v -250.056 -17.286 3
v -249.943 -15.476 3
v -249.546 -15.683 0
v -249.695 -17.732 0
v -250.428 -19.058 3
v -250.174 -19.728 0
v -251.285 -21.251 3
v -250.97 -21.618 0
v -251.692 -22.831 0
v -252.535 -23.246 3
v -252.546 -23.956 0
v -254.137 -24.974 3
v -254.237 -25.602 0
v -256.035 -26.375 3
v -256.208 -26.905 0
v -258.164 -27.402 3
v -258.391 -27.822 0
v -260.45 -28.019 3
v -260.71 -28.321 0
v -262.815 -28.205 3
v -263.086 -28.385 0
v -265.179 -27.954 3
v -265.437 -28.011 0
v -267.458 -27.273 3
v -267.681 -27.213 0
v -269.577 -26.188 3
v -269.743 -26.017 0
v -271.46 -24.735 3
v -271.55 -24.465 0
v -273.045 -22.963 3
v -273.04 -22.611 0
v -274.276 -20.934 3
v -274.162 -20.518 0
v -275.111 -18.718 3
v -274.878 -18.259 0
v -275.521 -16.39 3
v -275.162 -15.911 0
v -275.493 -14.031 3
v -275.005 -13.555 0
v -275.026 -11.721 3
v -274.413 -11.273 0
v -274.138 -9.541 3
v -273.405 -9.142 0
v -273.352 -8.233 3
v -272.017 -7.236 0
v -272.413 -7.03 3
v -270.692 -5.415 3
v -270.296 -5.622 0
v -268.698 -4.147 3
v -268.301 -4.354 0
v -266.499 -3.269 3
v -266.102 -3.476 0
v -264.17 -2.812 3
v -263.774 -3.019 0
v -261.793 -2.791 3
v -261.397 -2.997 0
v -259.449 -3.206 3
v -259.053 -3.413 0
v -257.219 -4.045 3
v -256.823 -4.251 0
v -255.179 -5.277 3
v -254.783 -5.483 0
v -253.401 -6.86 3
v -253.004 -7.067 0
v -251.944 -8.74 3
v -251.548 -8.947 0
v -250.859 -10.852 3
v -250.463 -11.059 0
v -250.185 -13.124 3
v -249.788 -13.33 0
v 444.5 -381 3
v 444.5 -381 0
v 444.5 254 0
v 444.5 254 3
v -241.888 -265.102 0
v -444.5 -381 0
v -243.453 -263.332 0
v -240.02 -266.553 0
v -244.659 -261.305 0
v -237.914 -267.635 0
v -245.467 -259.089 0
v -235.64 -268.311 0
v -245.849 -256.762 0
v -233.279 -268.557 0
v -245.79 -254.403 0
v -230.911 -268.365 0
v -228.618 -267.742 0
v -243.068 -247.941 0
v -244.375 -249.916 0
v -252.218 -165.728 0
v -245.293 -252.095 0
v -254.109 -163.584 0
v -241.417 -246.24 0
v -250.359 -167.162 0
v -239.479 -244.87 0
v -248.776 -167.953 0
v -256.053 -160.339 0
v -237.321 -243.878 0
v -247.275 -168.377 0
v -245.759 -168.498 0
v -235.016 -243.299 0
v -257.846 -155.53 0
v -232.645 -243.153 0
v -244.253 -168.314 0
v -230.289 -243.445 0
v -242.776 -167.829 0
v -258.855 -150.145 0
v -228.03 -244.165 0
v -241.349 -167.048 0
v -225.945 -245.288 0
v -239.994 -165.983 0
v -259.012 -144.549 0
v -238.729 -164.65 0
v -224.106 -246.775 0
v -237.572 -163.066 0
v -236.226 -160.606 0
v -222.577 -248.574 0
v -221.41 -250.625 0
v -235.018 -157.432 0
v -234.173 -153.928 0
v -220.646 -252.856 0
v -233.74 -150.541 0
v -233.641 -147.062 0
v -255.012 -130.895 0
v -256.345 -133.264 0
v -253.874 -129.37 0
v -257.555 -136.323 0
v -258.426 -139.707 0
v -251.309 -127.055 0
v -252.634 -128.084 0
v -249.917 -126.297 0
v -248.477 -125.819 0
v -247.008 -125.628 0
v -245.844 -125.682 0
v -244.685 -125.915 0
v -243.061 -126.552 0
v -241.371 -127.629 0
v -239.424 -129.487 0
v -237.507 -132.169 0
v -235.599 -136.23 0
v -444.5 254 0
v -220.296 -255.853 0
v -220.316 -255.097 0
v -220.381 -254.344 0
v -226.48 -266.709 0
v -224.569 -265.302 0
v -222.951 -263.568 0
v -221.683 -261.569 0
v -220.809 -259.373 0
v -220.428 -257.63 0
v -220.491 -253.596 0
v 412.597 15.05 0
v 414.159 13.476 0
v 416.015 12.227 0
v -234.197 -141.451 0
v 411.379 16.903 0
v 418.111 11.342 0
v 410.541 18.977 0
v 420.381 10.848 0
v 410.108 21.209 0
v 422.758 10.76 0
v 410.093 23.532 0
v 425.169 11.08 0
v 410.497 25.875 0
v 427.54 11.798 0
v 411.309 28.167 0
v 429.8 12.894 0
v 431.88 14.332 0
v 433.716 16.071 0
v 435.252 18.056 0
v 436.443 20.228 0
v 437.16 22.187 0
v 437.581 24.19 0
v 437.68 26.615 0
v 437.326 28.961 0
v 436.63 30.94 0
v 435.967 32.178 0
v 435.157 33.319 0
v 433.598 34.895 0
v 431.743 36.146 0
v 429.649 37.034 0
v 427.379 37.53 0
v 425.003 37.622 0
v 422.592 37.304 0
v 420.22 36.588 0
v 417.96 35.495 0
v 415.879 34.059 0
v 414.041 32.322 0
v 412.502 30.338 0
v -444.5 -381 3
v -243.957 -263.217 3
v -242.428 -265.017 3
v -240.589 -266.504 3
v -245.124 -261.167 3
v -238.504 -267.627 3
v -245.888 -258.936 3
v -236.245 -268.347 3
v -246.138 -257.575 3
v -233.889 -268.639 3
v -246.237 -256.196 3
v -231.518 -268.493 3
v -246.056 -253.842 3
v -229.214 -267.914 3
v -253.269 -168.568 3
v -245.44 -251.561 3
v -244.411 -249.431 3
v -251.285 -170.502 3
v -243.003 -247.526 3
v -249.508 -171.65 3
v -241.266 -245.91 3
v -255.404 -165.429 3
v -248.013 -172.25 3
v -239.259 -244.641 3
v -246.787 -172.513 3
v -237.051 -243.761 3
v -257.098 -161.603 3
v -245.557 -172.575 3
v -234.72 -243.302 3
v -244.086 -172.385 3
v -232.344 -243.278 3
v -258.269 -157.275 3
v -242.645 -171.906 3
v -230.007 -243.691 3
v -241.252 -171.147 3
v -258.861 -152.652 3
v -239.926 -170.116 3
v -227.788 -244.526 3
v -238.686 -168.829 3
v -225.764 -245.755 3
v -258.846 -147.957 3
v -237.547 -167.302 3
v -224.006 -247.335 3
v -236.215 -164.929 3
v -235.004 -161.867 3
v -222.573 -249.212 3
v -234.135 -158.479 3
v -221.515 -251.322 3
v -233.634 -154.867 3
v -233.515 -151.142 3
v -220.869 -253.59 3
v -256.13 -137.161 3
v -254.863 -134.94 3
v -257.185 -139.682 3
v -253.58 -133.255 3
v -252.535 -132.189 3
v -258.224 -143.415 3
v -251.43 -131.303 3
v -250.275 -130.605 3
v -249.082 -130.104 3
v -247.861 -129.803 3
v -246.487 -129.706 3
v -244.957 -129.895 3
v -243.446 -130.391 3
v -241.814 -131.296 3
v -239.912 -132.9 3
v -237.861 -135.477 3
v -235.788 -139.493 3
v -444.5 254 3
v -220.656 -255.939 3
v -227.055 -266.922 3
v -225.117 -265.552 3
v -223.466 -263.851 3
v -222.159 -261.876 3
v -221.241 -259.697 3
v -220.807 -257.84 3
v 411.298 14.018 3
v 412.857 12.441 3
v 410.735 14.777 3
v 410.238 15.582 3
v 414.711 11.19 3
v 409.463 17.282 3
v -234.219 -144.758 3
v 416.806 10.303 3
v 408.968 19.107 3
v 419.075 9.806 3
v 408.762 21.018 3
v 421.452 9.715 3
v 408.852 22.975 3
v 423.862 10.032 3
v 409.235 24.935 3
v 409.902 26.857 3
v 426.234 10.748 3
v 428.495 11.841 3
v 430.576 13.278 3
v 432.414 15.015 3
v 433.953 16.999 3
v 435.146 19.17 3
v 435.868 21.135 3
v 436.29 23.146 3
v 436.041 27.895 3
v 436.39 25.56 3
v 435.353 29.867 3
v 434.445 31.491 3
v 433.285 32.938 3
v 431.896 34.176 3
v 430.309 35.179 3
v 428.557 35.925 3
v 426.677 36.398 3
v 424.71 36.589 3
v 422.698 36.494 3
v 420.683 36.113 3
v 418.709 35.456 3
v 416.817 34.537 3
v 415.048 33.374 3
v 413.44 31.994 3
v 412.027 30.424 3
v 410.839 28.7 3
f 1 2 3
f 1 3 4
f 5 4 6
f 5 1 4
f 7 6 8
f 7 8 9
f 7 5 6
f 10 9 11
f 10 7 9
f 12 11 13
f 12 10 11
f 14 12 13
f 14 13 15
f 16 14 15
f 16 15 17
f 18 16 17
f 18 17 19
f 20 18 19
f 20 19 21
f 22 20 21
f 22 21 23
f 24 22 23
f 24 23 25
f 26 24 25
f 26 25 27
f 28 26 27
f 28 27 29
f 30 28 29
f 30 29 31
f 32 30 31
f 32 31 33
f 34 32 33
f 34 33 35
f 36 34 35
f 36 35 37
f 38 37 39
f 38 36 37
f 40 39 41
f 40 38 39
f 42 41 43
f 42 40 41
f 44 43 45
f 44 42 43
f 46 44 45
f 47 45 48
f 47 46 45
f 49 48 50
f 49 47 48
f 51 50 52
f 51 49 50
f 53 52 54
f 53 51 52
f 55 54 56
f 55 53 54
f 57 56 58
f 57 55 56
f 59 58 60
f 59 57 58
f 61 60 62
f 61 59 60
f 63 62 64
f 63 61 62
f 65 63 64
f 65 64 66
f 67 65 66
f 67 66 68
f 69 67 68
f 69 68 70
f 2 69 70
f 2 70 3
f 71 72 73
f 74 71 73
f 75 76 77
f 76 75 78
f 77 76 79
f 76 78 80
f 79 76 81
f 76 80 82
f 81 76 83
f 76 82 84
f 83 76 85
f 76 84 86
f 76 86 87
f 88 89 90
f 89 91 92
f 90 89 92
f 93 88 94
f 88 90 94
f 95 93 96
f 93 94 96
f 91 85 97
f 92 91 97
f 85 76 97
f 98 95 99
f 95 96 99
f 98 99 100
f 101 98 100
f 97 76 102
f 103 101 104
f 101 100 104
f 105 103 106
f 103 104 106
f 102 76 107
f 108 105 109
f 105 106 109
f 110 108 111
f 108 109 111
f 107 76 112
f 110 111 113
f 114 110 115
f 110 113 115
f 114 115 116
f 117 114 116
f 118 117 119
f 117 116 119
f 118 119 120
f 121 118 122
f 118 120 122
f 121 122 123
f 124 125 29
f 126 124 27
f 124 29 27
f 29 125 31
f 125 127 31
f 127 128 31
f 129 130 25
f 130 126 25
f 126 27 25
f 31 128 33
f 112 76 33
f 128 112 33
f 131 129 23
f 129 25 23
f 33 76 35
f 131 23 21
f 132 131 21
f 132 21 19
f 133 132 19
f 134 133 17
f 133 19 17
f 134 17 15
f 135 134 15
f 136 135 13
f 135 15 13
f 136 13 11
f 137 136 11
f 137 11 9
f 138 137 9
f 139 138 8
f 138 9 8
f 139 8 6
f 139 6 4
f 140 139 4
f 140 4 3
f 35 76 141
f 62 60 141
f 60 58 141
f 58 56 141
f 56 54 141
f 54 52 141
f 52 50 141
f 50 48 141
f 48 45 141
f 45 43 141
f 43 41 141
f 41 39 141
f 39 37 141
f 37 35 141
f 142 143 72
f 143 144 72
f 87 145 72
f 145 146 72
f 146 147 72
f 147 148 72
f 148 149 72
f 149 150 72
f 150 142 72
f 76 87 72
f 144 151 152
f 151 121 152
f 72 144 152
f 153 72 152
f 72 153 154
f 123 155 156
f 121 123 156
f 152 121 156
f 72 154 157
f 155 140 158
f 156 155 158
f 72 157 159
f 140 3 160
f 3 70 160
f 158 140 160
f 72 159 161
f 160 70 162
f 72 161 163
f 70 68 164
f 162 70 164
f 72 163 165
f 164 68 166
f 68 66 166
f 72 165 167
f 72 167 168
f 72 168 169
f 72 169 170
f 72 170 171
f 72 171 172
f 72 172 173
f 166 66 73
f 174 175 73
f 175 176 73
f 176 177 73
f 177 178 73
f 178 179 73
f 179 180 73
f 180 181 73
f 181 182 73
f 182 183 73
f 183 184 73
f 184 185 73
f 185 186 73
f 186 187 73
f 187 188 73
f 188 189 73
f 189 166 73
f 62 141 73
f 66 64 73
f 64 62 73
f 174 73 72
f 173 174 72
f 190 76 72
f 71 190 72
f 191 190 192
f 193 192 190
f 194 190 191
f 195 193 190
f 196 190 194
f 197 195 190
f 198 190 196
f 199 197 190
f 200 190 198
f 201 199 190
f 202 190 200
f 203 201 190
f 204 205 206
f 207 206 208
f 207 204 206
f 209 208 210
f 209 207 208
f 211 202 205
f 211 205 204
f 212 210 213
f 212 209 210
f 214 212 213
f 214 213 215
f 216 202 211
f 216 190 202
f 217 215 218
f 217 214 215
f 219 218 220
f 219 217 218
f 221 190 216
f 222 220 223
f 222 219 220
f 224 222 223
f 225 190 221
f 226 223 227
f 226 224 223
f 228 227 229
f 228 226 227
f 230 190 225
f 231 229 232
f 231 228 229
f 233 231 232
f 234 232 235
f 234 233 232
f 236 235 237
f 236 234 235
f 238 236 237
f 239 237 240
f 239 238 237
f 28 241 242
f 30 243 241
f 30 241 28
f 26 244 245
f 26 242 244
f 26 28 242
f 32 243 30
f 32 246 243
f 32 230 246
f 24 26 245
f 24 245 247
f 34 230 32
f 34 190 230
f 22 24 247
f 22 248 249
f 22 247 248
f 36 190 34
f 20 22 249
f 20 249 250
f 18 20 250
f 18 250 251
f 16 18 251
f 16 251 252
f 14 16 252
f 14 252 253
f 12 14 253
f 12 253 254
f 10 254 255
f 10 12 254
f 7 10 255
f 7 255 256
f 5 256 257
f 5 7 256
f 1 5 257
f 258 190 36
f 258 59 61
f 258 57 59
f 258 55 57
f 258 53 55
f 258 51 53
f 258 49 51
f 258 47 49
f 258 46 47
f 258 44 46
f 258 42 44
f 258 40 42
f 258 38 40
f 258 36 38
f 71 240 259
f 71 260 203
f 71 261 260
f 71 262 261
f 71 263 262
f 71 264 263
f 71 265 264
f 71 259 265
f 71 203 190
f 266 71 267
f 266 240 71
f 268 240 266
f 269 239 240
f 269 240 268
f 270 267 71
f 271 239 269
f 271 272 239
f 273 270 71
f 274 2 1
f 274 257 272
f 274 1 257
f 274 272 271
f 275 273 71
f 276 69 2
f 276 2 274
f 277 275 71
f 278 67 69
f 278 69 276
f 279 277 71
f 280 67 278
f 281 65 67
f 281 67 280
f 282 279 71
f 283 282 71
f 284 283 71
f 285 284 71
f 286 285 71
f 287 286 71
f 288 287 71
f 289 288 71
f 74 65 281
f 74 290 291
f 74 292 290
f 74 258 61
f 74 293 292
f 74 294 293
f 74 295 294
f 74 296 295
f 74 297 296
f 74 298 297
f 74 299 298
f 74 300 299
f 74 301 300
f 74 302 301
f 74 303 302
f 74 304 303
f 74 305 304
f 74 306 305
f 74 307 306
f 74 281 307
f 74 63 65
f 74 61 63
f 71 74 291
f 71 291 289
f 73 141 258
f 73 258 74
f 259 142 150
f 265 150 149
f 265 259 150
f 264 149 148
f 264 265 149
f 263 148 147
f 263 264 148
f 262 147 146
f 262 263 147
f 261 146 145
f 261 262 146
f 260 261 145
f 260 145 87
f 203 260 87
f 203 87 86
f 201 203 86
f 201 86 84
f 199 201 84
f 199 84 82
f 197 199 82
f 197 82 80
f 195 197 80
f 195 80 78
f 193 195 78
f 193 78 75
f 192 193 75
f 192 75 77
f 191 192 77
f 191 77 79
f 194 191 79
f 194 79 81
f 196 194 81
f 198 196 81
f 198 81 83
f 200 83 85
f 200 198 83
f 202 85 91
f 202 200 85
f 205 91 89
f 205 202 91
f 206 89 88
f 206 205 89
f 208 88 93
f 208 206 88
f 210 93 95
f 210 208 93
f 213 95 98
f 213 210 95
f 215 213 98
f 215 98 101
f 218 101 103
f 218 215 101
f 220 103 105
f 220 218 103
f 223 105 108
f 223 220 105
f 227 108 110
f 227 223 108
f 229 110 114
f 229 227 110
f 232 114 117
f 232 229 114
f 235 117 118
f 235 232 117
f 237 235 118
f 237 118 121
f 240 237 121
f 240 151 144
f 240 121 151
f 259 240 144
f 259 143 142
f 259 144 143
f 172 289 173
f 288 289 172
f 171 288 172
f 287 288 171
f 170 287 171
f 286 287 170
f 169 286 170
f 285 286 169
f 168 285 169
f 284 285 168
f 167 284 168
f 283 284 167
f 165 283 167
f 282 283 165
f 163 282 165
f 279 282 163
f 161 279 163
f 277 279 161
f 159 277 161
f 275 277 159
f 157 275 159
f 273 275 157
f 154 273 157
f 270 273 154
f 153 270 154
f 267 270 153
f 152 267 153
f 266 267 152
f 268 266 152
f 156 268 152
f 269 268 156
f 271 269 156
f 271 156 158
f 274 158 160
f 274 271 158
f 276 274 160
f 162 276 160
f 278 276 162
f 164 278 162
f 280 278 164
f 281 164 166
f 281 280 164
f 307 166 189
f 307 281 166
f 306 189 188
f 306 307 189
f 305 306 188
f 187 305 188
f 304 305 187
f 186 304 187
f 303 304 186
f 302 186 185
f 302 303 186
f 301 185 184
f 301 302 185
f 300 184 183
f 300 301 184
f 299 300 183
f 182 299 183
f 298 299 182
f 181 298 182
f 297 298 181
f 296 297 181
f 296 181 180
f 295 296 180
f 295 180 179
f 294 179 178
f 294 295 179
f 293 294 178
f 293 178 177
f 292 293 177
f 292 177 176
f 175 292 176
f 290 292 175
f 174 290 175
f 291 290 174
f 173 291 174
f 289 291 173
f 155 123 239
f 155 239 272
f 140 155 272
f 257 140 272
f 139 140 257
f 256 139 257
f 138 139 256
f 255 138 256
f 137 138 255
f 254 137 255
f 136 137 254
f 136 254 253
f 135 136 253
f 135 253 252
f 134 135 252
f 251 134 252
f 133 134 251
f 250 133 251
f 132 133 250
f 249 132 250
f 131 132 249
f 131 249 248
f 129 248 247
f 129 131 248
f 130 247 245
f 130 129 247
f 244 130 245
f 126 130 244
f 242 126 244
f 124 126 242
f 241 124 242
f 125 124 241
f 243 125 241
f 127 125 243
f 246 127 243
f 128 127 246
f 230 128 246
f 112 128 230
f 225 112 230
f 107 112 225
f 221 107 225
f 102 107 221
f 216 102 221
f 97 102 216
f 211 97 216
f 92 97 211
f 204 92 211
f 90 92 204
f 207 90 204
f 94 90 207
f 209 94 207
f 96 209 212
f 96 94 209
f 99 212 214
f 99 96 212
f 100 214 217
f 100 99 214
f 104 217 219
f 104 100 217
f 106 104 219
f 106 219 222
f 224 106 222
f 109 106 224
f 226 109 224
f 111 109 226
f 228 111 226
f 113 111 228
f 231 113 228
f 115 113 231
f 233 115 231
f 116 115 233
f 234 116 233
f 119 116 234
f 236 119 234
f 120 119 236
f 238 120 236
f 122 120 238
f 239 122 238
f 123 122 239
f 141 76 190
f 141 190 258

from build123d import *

# Parameters (mm, degrees)
SKETCH1_W           = 889
SKETCH1_H           = 635
BOSS_EXTRUDE1_DEPTH = 3
CAVITY1_START       = -39.73878613
CAVITY1_OUTLINE_R   = 12.7
CAVITY1_DEPTH       = 6.162318367
CAVITY1_START_2     = 95.028980994
CAVITY1_2_OUTLINE_R = 12.7
CAVITY1_2_DEPTH     = 39.622761672
CAVITY1_START_3     = -38.131795138
CAVITY1_3_OUTLINE_R = 12.7
CAVITY1_3_DEPTH     = 6.816543719
CAVITY1_START_4     = 156.456430578
CAVITY1_4_OUTLINE_R = 12.7
CAVITY1_4_DEPTH     = 17.482665183


# Read off the part's stored shape, not the designer's step: Cavity1
with BuildPart() as part:
    # Sketch1 → Boss-Extrude1 (new body)
    with BuildSketch(Plane.XY):
        with Locations((0, -63.5)):
            Rectangle(SKETCH1_W, SKETCH1_H)
    extrude(amount=BOSS_EXTRUDE1_DEPTH)

    # Cavity1 outline → Cavity1 (cut)
    with BuildSketch(Plane(origin=(0, 0, 0), x_dir=(0.9928632383141258, -0.0034499735487700917, 0.1192085889812489), z_dir=(0.11925850076362501, 0.028722077569289003, -0.9924477075673641)).offset(CAVITY1_START)):
        with Locations((-230.540732361, 255.745504345)):
            Circle(CAVITY1_OUTLINE_R)
    extrude(amount=CAVITY1_DEPTH, mode=Mode.SUBTRACT)

    # Cavity1 2 outline → Cavity1 2 (cut)
    with BuildSketch(Plane(origin=(0, 0, 0), x_dir=(0.9996900907049888, 0.020055402042160962, -0.014747996310634162), z_dir=(0.024894227167180604, -0.8053749390173811, 0.5922427585513381)).offset(CAVITY1_START_2)):
        with Locations((-249.218164977, -87.123506937)):
            Circle(CAVITY1_2_OUTLINE_R)
    extrude(amount=CAVITY1_2_DEPTH, mode=Mode.SUBTRACT)

    # Cavity1 3 outline → Cavity1 3 (cut)
    with BuildSketch(Plane(origin=(0, 0, 0), x_dir=(0.991429466218815, 0.00897431187314574, 0.13033447448575944), z_dir=(0.1306430767896851, -0.06810462099264145, -0.9890875325704865)).offset(CAVITY1_START_3)):
        with Locations((-260.24847135, 15.645526602)):
            Circle(CAVITY1_3_OUTLINE_R)
    extrude(amount=CAVITY1_3_DEPTH, mode=Mode.SUBTRACT)

    # Cavity1 4 outline → Cavity1 4 (cut)
    with BuildSketch(Plane(origin=(0, 0, 0), x_dir=(0.9264565352650909, -0.12370811638942411, 0.3554920395789254), z_dir=(0.3764017644281221, 0.30448898949357206, -0.8749903810971752)).offset(CAVITY1_START_4)):
        with Locations((389.706990351, -22.846486416)):
            Circle(CAVITY1_4_OUTLINE_R)
    extrude(amount=CAVITY1_4_DEPTH, mode=Mode.SUBTRACT)


solid = part.part
